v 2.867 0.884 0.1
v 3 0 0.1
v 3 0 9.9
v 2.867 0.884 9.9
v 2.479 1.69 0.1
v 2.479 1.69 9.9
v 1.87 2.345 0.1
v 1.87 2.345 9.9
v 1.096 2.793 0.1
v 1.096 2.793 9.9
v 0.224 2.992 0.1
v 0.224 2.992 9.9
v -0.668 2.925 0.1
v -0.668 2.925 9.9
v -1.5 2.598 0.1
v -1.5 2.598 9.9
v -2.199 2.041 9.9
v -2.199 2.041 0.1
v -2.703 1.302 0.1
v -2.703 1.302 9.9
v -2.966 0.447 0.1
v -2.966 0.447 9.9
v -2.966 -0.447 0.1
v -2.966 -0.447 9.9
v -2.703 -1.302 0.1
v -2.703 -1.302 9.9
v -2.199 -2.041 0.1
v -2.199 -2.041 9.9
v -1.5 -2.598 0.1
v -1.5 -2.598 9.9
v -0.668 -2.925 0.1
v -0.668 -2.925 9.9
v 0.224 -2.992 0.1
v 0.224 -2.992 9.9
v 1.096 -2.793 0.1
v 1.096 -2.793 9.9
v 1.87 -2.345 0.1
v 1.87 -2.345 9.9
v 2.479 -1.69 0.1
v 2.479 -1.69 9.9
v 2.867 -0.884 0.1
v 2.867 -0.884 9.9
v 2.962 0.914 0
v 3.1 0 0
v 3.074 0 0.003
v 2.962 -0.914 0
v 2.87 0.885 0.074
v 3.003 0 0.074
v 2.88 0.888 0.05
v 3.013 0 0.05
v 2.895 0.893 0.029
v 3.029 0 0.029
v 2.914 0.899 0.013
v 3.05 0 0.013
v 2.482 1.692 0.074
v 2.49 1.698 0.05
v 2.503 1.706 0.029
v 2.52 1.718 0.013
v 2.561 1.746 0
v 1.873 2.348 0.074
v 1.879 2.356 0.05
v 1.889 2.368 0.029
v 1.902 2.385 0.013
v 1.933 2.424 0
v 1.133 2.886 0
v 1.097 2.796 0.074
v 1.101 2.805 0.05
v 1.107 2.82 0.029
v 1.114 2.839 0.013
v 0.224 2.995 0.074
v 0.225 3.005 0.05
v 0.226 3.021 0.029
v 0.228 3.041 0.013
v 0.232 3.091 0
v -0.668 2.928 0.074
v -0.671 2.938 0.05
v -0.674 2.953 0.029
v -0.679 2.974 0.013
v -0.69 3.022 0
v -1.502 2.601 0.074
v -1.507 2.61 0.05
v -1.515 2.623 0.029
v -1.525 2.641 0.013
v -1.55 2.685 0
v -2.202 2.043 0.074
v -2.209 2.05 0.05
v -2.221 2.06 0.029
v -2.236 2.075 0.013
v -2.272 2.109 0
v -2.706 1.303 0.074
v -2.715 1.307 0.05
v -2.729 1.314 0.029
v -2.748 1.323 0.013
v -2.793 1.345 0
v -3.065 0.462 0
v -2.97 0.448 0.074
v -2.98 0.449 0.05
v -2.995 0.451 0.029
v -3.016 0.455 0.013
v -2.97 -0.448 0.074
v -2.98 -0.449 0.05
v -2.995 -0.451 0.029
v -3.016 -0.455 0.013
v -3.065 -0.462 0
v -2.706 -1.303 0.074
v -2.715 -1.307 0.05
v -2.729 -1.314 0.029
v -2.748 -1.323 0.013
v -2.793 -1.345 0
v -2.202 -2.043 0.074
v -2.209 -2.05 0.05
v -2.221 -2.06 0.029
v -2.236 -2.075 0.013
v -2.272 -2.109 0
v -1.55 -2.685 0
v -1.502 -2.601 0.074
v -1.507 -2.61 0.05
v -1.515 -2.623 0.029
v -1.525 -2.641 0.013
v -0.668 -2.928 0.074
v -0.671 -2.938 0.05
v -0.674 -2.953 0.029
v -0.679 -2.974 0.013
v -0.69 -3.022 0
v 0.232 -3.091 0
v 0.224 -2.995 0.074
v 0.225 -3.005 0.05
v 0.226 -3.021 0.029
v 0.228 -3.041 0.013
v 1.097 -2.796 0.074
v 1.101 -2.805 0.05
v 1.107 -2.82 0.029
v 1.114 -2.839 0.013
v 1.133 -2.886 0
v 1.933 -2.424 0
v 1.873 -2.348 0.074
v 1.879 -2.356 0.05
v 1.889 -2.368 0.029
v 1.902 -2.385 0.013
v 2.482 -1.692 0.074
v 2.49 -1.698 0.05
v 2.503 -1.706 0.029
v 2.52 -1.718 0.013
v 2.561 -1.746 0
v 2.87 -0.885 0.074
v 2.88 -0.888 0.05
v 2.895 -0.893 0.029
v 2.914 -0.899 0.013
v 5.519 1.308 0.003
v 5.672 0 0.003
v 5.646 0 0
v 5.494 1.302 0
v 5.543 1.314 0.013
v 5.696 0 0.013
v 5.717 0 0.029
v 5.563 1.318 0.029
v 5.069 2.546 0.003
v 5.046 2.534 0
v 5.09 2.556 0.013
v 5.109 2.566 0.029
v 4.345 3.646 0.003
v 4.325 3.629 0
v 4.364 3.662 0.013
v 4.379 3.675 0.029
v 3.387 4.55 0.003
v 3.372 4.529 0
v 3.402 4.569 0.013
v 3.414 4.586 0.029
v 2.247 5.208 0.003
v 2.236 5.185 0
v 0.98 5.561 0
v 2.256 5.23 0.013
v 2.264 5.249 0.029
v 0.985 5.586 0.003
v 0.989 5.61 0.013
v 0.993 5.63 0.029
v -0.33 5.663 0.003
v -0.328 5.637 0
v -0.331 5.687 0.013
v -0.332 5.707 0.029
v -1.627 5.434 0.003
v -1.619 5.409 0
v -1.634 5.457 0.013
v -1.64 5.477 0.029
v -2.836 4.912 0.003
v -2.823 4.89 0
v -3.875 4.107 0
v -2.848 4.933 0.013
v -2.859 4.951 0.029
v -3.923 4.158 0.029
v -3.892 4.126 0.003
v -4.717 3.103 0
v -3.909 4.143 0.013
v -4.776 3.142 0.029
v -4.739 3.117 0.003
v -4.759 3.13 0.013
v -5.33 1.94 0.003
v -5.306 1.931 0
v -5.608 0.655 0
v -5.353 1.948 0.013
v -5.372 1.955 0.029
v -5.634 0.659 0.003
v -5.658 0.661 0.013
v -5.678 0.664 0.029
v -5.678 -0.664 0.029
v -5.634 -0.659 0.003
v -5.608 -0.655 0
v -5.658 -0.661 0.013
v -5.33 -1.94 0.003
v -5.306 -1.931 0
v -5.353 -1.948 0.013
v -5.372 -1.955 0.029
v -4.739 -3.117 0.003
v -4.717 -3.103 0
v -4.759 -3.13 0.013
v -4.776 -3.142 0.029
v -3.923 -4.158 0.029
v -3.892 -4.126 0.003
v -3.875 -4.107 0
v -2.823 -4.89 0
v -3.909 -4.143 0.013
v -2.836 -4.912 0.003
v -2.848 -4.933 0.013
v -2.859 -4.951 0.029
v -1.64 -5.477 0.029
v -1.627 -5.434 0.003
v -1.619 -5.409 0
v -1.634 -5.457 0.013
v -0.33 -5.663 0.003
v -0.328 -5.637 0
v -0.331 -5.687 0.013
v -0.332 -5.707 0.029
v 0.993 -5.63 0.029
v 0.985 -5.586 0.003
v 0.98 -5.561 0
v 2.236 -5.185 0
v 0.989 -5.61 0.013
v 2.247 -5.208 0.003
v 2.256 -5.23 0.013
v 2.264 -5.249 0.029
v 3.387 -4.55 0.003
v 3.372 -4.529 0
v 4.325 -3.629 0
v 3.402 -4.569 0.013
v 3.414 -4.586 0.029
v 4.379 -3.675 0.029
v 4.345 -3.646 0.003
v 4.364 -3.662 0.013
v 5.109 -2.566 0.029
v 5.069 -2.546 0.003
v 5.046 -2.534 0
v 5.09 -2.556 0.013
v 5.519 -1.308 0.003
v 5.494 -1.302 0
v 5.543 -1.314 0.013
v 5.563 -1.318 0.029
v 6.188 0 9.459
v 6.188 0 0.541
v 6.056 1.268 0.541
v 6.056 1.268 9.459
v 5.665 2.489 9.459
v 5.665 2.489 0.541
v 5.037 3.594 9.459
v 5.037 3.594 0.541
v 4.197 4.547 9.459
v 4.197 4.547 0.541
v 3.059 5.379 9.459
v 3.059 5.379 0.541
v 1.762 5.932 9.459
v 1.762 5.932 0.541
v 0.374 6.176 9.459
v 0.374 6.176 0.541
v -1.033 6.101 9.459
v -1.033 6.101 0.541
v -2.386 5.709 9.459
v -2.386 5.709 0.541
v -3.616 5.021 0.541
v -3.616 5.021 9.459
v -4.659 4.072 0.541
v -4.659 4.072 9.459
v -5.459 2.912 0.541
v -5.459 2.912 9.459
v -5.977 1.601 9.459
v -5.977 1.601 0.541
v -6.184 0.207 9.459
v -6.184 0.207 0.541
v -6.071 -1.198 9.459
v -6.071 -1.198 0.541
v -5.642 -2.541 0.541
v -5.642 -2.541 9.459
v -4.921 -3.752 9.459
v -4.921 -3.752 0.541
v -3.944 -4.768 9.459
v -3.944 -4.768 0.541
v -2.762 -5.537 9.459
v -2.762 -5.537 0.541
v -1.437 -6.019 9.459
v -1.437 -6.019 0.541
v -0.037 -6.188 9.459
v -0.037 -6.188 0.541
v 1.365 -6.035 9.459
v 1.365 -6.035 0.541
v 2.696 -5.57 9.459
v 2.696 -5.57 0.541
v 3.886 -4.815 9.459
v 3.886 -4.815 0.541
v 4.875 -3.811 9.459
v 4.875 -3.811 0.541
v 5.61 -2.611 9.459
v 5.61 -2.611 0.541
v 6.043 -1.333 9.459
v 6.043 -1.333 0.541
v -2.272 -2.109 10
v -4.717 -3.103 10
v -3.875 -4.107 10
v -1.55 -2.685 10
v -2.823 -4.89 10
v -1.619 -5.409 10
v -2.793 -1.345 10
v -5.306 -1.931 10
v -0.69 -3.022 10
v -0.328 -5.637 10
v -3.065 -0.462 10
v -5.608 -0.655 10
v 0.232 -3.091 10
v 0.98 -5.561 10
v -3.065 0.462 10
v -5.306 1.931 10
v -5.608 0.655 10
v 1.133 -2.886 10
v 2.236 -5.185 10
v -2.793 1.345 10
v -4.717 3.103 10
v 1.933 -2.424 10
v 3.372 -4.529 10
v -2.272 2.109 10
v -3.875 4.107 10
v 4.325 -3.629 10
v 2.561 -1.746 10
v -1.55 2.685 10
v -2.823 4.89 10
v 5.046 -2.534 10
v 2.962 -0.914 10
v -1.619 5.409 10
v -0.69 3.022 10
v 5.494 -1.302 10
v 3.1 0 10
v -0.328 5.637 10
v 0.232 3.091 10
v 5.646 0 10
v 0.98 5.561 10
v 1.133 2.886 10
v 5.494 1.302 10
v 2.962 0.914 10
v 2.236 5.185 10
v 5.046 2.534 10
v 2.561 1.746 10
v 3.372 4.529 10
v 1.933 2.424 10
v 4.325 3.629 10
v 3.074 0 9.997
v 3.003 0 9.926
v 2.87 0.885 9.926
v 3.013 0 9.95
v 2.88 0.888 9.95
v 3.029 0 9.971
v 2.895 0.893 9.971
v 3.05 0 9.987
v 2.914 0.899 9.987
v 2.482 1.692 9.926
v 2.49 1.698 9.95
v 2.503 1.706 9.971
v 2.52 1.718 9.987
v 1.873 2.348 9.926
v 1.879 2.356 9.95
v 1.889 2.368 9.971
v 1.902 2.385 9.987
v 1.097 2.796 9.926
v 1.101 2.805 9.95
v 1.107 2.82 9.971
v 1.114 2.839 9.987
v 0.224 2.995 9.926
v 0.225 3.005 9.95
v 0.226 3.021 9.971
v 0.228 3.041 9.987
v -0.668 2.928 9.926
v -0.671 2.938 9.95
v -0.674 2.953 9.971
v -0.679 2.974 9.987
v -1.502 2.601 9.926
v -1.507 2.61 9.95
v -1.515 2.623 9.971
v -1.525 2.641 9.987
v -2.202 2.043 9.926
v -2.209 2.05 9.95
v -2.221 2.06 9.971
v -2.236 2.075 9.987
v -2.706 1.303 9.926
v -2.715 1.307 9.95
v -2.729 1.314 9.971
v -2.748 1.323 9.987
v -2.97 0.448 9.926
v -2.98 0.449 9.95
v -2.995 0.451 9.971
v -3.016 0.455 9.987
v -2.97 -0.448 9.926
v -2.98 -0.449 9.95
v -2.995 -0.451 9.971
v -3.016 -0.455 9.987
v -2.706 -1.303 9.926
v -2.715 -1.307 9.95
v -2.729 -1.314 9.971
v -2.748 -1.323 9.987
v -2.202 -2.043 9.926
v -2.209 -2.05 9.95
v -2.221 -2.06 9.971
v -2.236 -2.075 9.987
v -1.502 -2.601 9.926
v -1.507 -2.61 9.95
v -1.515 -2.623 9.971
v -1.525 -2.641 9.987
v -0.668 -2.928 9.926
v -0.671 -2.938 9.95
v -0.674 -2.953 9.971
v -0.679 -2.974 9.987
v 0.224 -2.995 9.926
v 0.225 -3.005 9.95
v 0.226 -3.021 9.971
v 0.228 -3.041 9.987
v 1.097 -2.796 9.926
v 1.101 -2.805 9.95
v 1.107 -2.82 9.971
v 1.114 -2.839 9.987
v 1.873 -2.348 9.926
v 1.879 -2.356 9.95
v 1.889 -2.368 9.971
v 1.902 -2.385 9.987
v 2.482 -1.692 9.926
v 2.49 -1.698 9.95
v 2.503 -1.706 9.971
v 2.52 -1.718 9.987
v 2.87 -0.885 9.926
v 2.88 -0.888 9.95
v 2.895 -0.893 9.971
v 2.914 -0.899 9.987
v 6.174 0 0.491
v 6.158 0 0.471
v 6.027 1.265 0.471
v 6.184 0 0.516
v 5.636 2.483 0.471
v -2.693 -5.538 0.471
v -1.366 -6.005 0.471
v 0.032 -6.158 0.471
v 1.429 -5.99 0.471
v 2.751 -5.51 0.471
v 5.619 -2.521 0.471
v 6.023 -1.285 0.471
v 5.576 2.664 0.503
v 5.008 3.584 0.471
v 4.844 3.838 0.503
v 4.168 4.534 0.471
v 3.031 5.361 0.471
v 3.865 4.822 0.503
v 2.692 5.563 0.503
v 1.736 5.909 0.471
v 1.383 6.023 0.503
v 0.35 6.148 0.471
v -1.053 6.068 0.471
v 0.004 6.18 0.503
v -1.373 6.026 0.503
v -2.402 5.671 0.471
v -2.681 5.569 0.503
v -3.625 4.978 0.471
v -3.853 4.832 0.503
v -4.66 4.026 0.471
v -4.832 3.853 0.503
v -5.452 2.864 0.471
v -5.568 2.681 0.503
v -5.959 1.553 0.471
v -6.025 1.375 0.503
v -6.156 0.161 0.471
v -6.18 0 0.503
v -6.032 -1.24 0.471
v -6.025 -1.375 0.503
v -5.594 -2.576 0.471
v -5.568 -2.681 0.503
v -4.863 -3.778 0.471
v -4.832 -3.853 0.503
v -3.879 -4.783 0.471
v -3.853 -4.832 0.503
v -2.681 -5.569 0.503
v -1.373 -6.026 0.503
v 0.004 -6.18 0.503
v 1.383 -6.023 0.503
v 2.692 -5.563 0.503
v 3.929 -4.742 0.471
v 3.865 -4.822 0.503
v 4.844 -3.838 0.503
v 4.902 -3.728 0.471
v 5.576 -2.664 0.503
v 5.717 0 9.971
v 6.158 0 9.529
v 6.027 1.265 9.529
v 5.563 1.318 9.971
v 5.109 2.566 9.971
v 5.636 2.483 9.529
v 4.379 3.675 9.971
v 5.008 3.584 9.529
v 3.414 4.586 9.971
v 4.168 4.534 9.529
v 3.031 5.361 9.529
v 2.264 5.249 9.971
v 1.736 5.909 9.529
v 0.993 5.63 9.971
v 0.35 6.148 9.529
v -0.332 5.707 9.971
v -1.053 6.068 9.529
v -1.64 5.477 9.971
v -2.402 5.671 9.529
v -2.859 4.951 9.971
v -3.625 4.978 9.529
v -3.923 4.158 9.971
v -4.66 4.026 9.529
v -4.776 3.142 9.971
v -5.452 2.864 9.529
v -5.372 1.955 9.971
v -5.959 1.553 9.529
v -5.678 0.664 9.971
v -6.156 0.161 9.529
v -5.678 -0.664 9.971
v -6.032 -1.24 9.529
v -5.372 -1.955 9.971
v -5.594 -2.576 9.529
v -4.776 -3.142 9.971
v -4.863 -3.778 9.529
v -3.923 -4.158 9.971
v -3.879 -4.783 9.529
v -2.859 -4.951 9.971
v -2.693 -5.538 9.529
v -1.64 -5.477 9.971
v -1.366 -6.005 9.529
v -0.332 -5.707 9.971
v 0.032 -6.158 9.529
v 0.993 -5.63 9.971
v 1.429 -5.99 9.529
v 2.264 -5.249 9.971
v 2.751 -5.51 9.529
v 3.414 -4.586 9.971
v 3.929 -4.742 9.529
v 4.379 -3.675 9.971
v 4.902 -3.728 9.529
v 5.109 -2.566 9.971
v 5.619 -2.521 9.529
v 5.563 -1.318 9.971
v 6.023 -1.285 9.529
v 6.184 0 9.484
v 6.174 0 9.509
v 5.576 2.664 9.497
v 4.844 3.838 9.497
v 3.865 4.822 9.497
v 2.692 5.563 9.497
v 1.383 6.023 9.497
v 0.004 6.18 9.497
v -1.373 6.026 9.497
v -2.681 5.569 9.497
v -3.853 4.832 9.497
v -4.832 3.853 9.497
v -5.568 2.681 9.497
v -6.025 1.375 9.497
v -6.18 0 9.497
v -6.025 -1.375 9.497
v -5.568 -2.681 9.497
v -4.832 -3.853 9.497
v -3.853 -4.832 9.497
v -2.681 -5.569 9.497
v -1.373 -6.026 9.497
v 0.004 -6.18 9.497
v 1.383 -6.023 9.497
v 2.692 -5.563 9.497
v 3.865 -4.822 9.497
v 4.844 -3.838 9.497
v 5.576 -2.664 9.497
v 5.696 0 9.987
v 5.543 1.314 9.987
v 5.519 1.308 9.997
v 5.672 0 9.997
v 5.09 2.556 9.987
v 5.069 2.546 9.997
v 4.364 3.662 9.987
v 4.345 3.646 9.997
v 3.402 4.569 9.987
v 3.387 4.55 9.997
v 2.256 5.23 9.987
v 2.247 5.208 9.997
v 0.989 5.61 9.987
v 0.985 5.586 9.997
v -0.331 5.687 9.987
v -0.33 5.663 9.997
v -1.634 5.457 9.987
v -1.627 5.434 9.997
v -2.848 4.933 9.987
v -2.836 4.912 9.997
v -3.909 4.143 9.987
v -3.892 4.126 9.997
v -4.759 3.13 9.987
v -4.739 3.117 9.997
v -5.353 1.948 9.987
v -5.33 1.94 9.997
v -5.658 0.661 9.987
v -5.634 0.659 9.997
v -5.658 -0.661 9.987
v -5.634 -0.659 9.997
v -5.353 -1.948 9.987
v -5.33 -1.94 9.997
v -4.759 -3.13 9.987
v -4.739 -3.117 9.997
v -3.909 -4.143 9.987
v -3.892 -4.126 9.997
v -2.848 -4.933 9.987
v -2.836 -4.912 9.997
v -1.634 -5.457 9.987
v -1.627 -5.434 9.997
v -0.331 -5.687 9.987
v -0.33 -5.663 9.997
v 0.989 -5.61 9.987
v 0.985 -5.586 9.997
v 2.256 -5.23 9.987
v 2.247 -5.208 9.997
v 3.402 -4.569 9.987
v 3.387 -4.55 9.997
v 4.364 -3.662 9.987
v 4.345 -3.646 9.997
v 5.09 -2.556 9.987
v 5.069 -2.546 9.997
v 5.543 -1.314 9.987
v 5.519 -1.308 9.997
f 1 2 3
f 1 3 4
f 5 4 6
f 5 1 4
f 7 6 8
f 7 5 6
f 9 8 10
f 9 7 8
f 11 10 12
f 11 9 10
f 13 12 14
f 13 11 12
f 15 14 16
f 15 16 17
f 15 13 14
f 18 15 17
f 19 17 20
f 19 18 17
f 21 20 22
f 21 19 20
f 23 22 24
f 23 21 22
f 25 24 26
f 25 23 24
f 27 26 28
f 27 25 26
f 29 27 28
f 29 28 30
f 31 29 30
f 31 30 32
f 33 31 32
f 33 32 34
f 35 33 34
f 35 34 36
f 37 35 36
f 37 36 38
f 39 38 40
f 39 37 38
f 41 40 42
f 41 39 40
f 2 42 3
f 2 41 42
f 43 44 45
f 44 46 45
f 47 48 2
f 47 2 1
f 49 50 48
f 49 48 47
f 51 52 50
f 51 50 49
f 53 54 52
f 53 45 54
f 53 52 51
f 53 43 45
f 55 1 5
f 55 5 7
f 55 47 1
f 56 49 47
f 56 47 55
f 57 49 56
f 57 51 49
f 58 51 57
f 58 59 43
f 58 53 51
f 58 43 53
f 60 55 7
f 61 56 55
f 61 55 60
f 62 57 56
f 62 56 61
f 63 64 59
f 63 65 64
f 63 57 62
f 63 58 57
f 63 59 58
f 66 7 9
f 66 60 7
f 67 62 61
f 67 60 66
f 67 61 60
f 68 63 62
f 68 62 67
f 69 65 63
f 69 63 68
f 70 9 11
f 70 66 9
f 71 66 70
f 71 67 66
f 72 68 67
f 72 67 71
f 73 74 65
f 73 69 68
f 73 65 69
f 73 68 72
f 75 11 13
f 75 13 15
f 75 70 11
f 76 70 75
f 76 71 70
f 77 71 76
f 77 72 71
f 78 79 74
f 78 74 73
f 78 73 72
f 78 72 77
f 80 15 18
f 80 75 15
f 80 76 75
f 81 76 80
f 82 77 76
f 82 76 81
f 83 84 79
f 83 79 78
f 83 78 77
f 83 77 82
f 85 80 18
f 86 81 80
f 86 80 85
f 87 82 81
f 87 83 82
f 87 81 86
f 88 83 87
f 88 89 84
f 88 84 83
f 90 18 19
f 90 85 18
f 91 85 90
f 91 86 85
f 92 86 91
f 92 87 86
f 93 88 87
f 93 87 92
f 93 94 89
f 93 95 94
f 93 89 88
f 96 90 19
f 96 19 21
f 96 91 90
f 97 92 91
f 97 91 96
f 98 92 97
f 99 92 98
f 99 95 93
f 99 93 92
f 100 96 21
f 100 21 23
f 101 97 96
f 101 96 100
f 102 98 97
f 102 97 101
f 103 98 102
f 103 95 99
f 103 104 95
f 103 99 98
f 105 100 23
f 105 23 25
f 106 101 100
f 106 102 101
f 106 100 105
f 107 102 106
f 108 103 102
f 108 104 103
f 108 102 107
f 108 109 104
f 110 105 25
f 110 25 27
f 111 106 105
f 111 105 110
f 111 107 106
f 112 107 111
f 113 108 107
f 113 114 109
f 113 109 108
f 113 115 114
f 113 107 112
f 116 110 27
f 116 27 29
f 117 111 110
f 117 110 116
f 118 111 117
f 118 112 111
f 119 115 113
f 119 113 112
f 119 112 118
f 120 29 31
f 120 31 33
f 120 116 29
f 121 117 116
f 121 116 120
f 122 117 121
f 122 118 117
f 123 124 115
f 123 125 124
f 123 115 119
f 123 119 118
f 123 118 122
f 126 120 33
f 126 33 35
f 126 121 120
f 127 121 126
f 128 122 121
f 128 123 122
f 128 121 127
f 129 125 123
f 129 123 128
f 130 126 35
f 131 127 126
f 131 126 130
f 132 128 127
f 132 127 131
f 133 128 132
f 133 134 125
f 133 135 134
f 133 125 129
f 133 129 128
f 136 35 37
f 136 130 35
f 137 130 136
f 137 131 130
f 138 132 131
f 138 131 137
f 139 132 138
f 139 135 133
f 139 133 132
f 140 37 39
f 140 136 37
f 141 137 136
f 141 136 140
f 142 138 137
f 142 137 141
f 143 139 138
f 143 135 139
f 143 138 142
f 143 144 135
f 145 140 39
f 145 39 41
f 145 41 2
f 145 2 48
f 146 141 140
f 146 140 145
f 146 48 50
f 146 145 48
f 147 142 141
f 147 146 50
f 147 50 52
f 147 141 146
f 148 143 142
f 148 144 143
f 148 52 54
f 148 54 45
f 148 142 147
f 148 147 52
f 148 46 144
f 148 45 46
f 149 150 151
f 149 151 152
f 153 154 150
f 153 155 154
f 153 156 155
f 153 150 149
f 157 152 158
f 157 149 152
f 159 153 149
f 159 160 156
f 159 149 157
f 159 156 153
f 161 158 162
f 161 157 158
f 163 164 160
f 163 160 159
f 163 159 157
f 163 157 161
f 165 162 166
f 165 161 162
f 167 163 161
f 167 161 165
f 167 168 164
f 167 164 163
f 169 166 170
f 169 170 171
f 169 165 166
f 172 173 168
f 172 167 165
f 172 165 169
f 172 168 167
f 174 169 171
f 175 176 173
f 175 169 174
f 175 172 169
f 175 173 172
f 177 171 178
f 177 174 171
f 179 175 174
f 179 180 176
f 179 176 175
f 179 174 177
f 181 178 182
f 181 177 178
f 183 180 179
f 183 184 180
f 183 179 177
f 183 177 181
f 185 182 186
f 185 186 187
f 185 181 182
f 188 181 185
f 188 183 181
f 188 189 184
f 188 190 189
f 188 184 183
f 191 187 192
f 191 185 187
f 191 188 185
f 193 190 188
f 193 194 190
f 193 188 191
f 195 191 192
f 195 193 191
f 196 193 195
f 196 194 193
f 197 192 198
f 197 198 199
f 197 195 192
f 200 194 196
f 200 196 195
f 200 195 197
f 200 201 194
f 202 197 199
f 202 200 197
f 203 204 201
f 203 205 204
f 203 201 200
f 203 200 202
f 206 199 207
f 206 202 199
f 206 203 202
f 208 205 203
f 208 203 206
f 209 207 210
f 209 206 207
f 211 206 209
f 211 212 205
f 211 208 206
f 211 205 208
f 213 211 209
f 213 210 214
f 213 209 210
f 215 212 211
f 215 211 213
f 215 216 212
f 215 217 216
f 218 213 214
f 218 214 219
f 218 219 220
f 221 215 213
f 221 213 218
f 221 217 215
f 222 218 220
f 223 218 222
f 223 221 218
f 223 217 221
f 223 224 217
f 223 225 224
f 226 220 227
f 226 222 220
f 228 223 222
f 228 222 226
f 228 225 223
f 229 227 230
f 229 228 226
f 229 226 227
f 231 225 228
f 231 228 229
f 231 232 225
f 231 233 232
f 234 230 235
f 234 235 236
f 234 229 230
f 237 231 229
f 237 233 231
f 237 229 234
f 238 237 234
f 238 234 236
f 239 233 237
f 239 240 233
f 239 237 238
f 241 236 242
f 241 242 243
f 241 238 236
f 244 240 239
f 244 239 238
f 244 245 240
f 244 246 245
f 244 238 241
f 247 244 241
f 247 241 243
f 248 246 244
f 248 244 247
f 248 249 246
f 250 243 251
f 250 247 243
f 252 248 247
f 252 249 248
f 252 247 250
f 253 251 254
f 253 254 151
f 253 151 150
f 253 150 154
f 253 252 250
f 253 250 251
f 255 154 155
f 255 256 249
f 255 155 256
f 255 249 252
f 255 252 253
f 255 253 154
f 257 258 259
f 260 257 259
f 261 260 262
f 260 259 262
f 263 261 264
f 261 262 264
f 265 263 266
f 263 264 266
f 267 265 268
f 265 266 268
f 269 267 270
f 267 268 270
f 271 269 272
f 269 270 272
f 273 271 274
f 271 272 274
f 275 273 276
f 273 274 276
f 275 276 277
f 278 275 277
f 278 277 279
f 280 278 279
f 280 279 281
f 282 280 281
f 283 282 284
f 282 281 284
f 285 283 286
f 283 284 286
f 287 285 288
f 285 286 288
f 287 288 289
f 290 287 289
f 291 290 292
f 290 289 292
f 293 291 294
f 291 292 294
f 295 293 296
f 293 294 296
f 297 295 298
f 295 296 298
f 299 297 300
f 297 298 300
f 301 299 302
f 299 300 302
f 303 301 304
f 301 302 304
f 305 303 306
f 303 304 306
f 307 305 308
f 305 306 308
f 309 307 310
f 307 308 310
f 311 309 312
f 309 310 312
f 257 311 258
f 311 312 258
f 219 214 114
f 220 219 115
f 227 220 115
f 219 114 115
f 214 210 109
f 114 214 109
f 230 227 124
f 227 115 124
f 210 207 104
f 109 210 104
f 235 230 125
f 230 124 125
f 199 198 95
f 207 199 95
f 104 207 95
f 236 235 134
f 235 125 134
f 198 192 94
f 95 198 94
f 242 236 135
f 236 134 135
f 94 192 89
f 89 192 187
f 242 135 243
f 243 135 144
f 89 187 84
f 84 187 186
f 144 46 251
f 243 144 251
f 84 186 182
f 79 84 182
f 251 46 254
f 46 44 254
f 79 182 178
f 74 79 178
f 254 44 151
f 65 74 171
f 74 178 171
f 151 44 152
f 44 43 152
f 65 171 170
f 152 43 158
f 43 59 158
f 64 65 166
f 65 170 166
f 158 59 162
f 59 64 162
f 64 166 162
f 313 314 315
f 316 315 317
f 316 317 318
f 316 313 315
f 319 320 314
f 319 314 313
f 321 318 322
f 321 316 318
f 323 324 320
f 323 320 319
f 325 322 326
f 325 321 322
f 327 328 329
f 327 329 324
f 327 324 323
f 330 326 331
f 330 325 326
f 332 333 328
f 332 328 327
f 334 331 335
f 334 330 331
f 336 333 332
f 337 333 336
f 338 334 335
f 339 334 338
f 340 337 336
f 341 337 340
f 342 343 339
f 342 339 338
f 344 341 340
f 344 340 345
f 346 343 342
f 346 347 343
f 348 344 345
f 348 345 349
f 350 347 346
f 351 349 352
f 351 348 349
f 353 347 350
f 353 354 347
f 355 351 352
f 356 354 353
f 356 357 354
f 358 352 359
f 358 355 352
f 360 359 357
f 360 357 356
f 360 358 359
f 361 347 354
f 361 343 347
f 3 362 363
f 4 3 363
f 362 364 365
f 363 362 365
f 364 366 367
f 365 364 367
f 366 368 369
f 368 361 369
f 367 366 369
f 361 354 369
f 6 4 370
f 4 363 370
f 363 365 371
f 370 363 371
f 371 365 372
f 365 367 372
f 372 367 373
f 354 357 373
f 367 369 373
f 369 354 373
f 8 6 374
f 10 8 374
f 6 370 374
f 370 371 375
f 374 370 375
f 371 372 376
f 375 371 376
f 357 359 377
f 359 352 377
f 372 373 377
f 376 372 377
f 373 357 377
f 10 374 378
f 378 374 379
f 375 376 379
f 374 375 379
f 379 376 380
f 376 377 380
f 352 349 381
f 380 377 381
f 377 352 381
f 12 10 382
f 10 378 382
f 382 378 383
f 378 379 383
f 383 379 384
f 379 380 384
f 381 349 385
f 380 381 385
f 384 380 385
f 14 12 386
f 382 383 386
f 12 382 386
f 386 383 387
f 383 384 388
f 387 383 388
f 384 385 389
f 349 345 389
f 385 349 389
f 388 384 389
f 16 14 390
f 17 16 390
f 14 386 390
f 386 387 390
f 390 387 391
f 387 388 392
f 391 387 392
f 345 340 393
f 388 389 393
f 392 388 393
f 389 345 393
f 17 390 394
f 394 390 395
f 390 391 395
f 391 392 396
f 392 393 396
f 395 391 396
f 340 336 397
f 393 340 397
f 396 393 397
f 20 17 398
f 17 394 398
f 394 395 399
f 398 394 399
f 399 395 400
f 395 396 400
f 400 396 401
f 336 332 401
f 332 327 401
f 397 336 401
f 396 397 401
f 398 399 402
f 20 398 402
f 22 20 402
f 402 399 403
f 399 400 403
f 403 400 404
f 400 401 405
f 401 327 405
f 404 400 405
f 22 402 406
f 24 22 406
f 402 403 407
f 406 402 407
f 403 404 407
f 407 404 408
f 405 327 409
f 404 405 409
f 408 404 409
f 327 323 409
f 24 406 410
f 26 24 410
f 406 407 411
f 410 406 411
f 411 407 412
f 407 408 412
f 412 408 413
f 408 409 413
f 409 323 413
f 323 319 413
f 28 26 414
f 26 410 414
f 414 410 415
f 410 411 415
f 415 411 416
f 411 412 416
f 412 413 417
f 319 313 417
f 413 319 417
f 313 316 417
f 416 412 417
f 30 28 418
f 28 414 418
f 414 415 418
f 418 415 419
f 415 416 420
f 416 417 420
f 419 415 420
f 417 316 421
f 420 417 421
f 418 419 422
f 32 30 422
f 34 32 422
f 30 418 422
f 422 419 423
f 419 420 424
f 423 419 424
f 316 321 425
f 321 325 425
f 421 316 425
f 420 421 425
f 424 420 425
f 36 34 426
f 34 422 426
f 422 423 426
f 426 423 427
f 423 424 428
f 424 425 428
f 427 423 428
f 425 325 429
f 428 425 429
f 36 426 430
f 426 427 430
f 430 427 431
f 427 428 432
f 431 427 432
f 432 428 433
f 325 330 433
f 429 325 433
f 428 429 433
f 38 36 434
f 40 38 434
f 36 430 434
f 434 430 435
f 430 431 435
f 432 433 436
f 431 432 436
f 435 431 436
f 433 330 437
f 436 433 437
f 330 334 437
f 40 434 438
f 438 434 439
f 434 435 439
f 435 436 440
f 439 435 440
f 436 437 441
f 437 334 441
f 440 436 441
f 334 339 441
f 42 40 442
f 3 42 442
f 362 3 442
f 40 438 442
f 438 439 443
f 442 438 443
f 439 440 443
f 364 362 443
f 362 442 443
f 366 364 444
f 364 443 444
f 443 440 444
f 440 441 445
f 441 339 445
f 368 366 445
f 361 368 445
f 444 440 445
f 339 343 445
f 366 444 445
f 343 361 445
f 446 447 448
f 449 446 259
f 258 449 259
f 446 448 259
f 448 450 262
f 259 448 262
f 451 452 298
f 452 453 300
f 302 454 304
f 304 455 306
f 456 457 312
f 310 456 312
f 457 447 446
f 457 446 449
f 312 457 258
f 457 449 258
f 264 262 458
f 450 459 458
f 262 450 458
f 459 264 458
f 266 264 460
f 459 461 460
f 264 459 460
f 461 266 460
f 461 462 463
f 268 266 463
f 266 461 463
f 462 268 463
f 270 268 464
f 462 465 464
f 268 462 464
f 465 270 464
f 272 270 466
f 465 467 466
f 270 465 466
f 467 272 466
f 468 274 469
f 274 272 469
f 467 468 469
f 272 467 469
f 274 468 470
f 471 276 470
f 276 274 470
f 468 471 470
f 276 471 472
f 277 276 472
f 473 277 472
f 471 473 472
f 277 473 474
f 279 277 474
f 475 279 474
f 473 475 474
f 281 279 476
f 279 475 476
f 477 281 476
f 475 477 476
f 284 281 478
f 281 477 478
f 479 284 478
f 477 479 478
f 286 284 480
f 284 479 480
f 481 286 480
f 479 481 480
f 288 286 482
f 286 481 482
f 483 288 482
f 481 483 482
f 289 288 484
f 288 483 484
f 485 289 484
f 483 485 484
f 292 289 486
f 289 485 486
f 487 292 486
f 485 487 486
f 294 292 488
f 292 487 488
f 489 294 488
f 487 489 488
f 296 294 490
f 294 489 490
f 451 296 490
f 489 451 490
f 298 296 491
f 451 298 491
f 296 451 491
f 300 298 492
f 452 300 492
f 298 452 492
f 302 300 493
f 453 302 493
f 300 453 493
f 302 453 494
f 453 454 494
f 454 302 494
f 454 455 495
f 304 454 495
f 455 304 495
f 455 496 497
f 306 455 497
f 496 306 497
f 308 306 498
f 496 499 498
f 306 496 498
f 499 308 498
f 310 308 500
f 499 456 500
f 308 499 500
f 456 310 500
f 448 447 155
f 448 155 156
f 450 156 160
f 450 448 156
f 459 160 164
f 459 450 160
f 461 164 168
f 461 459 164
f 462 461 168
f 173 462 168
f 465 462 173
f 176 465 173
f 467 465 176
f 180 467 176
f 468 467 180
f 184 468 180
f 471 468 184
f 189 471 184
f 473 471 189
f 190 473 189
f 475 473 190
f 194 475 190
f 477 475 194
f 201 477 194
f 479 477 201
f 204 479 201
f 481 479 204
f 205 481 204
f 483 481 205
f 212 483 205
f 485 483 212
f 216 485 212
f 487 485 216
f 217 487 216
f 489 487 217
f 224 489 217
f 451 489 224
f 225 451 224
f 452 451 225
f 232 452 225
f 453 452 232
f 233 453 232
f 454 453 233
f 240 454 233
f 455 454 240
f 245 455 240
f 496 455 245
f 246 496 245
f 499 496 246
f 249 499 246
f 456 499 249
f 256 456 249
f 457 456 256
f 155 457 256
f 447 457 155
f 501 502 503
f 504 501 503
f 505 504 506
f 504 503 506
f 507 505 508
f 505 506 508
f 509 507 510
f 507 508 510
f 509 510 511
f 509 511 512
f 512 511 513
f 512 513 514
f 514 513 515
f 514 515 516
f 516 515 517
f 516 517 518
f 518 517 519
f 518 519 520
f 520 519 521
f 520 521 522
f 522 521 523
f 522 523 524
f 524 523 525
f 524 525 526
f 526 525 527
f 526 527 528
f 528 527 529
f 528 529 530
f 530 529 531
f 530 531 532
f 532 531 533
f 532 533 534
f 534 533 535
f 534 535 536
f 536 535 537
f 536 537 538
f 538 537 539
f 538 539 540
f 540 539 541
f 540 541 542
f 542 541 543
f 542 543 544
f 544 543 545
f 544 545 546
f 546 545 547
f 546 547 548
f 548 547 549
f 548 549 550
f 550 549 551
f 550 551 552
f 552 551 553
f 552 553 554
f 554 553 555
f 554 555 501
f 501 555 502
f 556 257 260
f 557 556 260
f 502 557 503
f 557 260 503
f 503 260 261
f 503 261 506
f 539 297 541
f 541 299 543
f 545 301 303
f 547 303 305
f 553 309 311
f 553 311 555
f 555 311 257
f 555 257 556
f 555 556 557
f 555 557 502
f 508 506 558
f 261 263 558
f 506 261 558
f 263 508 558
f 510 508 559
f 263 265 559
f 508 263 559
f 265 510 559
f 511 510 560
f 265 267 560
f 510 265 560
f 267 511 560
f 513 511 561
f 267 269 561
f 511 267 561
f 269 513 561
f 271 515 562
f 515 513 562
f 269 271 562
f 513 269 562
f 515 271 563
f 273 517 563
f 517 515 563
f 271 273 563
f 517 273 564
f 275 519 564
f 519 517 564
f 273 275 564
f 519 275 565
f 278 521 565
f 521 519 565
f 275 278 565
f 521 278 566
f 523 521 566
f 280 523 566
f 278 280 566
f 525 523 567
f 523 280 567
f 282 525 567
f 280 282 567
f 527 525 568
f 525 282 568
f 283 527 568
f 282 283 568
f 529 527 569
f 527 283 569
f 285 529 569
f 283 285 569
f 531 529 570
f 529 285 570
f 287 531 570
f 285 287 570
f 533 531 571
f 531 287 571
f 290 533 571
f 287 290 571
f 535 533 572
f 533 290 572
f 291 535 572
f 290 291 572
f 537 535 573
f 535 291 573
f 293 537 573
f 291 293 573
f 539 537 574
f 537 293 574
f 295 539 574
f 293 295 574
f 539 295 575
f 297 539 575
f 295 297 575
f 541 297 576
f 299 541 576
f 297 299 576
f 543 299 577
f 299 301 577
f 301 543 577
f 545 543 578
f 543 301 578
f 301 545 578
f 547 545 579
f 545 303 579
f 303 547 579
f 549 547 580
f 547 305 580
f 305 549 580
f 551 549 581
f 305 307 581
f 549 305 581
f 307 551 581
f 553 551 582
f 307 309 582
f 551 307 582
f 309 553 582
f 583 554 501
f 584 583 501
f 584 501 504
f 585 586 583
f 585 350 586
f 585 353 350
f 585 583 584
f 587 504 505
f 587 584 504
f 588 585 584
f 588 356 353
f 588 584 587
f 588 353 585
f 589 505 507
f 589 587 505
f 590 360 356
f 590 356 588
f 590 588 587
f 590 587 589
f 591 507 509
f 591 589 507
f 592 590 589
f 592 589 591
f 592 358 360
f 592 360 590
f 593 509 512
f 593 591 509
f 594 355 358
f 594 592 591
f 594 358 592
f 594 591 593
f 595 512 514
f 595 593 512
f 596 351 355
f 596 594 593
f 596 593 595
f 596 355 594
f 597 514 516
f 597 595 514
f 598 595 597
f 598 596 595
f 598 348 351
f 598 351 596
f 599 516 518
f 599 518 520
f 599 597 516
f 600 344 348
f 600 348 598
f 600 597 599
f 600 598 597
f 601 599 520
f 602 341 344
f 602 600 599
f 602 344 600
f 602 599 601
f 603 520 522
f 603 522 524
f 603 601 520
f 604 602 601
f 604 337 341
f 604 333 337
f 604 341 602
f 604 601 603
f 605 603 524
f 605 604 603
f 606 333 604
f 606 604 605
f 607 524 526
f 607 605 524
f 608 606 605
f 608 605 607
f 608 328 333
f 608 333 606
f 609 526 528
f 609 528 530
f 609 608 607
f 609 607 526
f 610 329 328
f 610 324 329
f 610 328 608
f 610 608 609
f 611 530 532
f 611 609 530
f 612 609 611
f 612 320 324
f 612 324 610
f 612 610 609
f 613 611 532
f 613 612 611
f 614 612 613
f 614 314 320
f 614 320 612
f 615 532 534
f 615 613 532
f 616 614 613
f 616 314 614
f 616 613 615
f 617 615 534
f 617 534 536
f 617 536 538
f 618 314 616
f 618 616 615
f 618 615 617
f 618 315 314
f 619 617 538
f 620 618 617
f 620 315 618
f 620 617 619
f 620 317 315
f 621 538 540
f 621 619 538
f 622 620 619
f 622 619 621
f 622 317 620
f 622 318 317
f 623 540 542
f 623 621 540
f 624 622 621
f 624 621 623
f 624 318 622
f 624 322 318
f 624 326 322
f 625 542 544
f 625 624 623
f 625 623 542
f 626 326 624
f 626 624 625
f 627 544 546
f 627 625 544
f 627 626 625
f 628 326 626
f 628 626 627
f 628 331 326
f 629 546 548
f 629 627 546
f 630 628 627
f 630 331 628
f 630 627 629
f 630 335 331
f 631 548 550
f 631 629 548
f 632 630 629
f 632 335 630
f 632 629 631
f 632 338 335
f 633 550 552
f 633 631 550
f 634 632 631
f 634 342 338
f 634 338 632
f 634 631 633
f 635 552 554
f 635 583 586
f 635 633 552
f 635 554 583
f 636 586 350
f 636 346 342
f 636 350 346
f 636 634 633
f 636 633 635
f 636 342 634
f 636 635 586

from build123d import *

# Parameters (mm, degrees)
SKETCH1_R           = 6.187725479
SKETCH1_R_2         = 3
BOSS_EXTRUDE1_DEPTH = 10
FILLET1_R           = 0.1
CHAMFER1_SIZE       = 0.5
FILLET3_R           = 0.1


with BuildPart() as part:
    # Sketch1 → Boss-Extrude1 (new body)
    with BuildSketch(Plane.XY):
        Circle(SKETCH1_R)
        Circle(SKETCH1_R_2, mode=Mode.SUBTRACT)
    extrude(amount=BOSS_EXTRUDE1_DEPTH)

    # Fillet1
    fillet1_edges = [part.edges().sort_by_distance(p)[0] for p in [
        (-3, 0, 0),
        (-3, 0, 10),
    ]]
    fillet(fillet1_edges, radius=FILLET1_R)

    # Chamfer1
    chamfer1_edges = [part.edges().sort_by_distance(p)[0] for p in [
        (-6.187725479, 0, 0),
        (-6.187725479, 0, 10),
    ]]
    chamfer(chamfer1_edges, length=CHAMFER1_SIZE)

    # Fillet3
    fillet3_edges = [part.edges().sort_by_distance(p)[0] for p in [
        (-6.187725479, 0, 9.5),
        (-6.187725479, 0, 0.5),
        (-5.687725479, 0, 0),
        (-5.687725479, 0, 10),
    ]]
    fillet(fillet3_edges, radius=FILLET3_R)


solid = part.part
